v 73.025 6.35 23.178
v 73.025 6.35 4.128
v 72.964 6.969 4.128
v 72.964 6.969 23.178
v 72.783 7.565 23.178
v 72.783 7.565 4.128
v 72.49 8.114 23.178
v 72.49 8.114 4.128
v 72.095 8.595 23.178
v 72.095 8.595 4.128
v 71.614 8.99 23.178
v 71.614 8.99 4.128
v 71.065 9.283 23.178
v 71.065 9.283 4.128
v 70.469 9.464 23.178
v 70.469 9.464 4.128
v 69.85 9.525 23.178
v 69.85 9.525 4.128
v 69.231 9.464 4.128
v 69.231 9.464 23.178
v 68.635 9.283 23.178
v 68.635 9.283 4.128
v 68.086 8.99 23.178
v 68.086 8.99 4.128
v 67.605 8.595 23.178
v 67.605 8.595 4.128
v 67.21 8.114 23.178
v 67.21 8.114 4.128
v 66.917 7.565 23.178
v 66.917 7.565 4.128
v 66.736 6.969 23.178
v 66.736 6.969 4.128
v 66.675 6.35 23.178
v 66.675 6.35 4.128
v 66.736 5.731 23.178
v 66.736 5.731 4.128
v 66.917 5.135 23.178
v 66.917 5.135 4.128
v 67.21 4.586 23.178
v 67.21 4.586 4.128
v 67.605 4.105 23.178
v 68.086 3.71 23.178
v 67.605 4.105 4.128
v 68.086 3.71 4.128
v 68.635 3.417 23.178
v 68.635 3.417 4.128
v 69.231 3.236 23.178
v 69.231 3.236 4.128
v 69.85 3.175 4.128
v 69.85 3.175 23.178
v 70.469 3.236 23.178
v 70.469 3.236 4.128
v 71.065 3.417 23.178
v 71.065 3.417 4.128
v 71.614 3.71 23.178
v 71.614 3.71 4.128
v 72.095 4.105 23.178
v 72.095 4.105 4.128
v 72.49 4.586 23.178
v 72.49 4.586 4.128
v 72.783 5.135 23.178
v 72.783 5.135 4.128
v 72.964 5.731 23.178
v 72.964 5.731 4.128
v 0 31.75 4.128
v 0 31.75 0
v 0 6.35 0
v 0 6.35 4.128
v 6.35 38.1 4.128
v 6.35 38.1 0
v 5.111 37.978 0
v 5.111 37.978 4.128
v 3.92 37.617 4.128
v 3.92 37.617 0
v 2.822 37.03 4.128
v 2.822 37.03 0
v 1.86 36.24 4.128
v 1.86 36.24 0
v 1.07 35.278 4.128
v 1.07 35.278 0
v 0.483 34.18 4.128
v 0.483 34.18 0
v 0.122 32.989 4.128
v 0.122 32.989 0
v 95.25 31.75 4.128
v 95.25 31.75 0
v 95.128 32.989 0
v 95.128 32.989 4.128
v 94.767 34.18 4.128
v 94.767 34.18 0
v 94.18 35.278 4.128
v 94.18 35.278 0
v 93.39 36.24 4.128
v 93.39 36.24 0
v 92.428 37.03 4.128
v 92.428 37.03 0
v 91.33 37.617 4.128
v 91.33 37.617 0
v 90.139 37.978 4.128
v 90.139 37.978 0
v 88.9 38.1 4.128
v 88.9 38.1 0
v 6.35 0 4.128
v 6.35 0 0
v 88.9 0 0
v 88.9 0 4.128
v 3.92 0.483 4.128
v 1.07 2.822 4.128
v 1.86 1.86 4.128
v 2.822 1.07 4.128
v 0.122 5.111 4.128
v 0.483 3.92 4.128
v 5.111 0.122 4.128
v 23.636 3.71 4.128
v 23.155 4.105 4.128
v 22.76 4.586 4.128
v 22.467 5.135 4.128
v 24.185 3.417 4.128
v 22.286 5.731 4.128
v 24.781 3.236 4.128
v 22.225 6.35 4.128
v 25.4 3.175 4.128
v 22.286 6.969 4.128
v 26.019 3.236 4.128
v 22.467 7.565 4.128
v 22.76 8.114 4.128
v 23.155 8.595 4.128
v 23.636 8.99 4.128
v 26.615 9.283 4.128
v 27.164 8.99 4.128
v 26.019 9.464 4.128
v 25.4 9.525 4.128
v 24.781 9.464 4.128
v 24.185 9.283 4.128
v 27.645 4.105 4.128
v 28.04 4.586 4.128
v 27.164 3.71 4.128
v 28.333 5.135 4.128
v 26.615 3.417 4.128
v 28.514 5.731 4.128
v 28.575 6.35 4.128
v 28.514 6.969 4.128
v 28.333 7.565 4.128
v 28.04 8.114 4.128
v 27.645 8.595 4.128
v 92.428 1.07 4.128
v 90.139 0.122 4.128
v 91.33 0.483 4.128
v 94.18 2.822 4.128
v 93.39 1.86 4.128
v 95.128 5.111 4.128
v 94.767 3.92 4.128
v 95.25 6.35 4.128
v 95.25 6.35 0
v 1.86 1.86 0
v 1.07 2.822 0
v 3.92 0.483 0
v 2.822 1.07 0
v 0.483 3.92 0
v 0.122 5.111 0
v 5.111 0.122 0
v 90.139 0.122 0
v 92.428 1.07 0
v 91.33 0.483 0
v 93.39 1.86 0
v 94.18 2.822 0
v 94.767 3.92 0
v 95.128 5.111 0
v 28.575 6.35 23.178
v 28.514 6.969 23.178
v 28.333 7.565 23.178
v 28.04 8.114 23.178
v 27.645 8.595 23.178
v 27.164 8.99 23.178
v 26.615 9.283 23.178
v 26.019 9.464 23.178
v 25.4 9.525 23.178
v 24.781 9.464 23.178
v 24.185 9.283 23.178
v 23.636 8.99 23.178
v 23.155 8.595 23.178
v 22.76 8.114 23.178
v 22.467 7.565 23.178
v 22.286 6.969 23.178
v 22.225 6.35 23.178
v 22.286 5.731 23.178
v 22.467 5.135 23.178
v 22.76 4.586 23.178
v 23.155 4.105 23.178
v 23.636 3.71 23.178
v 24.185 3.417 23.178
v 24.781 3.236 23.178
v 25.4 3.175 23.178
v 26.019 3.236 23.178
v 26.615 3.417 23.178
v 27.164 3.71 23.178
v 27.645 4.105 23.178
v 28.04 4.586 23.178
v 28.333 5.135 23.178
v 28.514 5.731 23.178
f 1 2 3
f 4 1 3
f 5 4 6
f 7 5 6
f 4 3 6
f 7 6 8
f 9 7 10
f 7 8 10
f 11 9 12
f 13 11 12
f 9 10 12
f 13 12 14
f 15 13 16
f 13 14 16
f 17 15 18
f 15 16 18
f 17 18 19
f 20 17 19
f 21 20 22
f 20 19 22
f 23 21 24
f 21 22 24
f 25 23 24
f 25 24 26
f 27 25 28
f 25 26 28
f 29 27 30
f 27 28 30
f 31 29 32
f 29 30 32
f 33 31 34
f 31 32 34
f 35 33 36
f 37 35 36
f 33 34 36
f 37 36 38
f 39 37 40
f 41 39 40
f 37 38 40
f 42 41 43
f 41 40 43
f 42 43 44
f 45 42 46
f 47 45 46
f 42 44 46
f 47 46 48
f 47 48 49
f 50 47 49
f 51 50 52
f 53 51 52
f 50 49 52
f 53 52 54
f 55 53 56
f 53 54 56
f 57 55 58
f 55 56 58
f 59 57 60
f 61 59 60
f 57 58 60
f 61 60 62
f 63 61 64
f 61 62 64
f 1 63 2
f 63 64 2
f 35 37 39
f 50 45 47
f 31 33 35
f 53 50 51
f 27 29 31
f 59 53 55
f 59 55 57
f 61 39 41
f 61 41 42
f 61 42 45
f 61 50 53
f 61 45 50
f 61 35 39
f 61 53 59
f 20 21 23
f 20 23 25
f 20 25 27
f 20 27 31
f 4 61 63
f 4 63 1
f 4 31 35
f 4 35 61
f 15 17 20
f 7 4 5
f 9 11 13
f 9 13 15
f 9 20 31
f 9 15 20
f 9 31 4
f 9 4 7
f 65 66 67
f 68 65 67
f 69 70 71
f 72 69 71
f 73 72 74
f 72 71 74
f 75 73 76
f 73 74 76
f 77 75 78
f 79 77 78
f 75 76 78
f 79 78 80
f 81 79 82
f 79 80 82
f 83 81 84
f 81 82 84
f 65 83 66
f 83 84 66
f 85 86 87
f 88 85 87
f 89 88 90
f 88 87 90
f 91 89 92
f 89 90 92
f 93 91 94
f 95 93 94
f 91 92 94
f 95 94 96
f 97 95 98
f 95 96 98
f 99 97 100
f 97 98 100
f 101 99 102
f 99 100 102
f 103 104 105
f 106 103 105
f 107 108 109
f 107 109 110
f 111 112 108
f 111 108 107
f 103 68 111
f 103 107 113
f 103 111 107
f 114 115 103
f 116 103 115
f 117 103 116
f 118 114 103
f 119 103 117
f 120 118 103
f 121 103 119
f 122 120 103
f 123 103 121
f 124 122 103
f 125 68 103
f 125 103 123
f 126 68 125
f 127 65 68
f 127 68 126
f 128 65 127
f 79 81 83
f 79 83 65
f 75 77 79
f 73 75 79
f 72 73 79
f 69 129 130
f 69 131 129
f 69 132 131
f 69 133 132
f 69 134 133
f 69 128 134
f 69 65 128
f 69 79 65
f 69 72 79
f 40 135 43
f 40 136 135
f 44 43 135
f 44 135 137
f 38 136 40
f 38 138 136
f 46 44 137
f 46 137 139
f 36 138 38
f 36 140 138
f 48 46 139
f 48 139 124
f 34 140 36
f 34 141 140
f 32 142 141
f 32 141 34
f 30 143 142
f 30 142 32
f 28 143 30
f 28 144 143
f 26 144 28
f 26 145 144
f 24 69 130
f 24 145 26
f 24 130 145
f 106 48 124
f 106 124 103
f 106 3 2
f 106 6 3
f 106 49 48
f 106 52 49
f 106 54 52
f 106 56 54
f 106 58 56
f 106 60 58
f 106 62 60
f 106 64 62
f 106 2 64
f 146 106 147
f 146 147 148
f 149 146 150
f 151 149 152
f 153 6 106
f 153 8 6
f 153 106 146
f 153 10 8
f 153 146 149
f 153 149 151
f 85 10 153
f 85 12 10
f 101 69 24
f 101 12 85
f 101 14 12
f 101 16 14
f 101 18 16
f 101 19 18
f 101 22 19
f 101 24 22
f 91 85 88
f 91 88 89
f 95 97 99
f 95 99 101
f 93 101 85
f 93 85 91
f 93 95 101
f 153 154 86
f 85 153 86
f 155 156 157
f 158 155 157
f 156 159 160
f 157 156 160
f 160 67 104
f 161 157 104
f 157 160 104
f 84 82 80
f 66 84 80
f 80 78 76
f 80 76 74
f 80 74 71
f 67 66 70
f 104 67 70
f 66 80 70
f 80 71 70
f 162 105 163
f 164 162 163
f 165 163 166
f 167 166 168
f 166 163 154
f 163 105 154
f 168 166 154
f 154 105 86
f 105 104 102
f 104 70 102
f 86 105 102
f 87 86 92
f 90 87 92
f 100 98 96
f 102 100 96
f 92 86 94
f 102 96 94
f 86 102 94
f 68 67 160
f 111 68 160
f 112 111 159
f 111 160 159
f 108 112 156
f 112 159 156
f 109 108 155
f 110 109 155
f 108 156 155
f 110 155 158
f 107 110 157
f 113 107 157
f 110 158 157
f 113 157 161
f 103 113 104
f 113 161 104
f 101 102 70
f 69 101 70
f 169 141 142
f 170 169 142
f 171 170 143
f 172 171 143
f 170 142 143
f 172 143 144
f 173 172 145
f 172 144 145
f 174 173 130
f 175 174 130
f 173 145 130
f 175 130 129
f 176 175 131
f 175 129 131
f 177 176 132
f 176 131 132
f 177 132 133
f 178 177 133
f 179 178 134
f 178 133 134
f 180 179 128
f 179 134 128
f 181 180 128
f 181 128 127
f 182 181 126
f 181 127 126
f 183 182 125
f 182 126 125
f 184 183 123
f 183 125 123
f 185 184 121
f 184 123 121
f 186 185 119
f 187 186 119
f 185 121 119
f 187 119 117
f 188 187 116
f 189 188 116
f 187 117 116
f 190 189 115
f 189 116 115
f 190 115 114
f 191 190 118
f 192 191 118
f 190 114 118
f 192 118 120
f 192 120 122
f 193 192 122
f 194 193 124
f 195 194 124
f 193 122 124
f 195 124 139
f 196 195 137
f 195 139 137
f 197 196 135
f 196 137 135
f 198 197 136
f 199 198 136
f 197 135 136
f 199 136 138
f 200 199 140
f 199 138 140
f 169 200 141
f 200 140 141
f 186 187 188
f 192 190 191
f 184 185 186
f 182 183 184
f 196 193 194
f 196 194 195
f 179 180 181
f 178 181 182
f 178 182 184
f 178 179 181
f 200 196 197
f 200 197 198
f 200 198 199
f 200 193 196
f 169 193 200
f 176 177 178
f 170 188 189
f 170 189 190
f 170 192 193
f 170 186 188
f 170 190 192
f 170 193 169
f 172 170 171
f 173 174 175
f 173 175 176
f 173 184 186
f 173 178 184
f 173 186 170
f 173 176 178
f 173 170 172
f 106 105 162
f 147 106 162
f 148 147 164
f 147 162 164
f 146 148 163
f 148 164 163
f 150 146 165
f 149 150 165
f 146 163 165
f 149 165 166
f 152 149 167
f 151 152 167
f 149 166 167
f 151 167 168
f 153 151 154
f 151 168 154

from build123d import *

# Parameters (mm, degrees)
F1_DEPTH = 4.1275
F2_R     = 3.175
F3_DEPTH = 19.05


with BuildPart() as f1:
    # F0 (on Top) → F1 (new body)
    with BuildSketch(Plane.XY):
        with BuildLine():
            ThreePointArc((0, 6.35), (1.859872, 1.859872), (6.35, 0))
            Line((6.35, 0), (88.9, 0))
            ThreePointArc((88.9, 0), (93.390128, 1.859872), (95.25, 6.35))
            Line((95.25, 6.35), (95.25, 31.75))
            ThreePointArc((95.25, 31.75), (93.390128, 36.240128), (88.9, 38.1))
            Line((88.9, 38.1), (6.35, 38.1))
            ThreePointArc((6.35, 38.1), (1.859872, 36.240128), (0, 31.75))
            Line((0, 31.75), (0, 6.35))
        make_face()
    extrude(amount=F1_DEPTH)

    # F2 (on face) → F3 (join)
    with BuildSketch(Plane.XY.offset(4.1275)):
        with Locations((25.4, 6.35)):
            Circle(F2_R)
        with Locations((69.85, 6.35)):
            Circle(F2_R)
    extrude(amount=F3_DEPTH)


solid = f1.part
